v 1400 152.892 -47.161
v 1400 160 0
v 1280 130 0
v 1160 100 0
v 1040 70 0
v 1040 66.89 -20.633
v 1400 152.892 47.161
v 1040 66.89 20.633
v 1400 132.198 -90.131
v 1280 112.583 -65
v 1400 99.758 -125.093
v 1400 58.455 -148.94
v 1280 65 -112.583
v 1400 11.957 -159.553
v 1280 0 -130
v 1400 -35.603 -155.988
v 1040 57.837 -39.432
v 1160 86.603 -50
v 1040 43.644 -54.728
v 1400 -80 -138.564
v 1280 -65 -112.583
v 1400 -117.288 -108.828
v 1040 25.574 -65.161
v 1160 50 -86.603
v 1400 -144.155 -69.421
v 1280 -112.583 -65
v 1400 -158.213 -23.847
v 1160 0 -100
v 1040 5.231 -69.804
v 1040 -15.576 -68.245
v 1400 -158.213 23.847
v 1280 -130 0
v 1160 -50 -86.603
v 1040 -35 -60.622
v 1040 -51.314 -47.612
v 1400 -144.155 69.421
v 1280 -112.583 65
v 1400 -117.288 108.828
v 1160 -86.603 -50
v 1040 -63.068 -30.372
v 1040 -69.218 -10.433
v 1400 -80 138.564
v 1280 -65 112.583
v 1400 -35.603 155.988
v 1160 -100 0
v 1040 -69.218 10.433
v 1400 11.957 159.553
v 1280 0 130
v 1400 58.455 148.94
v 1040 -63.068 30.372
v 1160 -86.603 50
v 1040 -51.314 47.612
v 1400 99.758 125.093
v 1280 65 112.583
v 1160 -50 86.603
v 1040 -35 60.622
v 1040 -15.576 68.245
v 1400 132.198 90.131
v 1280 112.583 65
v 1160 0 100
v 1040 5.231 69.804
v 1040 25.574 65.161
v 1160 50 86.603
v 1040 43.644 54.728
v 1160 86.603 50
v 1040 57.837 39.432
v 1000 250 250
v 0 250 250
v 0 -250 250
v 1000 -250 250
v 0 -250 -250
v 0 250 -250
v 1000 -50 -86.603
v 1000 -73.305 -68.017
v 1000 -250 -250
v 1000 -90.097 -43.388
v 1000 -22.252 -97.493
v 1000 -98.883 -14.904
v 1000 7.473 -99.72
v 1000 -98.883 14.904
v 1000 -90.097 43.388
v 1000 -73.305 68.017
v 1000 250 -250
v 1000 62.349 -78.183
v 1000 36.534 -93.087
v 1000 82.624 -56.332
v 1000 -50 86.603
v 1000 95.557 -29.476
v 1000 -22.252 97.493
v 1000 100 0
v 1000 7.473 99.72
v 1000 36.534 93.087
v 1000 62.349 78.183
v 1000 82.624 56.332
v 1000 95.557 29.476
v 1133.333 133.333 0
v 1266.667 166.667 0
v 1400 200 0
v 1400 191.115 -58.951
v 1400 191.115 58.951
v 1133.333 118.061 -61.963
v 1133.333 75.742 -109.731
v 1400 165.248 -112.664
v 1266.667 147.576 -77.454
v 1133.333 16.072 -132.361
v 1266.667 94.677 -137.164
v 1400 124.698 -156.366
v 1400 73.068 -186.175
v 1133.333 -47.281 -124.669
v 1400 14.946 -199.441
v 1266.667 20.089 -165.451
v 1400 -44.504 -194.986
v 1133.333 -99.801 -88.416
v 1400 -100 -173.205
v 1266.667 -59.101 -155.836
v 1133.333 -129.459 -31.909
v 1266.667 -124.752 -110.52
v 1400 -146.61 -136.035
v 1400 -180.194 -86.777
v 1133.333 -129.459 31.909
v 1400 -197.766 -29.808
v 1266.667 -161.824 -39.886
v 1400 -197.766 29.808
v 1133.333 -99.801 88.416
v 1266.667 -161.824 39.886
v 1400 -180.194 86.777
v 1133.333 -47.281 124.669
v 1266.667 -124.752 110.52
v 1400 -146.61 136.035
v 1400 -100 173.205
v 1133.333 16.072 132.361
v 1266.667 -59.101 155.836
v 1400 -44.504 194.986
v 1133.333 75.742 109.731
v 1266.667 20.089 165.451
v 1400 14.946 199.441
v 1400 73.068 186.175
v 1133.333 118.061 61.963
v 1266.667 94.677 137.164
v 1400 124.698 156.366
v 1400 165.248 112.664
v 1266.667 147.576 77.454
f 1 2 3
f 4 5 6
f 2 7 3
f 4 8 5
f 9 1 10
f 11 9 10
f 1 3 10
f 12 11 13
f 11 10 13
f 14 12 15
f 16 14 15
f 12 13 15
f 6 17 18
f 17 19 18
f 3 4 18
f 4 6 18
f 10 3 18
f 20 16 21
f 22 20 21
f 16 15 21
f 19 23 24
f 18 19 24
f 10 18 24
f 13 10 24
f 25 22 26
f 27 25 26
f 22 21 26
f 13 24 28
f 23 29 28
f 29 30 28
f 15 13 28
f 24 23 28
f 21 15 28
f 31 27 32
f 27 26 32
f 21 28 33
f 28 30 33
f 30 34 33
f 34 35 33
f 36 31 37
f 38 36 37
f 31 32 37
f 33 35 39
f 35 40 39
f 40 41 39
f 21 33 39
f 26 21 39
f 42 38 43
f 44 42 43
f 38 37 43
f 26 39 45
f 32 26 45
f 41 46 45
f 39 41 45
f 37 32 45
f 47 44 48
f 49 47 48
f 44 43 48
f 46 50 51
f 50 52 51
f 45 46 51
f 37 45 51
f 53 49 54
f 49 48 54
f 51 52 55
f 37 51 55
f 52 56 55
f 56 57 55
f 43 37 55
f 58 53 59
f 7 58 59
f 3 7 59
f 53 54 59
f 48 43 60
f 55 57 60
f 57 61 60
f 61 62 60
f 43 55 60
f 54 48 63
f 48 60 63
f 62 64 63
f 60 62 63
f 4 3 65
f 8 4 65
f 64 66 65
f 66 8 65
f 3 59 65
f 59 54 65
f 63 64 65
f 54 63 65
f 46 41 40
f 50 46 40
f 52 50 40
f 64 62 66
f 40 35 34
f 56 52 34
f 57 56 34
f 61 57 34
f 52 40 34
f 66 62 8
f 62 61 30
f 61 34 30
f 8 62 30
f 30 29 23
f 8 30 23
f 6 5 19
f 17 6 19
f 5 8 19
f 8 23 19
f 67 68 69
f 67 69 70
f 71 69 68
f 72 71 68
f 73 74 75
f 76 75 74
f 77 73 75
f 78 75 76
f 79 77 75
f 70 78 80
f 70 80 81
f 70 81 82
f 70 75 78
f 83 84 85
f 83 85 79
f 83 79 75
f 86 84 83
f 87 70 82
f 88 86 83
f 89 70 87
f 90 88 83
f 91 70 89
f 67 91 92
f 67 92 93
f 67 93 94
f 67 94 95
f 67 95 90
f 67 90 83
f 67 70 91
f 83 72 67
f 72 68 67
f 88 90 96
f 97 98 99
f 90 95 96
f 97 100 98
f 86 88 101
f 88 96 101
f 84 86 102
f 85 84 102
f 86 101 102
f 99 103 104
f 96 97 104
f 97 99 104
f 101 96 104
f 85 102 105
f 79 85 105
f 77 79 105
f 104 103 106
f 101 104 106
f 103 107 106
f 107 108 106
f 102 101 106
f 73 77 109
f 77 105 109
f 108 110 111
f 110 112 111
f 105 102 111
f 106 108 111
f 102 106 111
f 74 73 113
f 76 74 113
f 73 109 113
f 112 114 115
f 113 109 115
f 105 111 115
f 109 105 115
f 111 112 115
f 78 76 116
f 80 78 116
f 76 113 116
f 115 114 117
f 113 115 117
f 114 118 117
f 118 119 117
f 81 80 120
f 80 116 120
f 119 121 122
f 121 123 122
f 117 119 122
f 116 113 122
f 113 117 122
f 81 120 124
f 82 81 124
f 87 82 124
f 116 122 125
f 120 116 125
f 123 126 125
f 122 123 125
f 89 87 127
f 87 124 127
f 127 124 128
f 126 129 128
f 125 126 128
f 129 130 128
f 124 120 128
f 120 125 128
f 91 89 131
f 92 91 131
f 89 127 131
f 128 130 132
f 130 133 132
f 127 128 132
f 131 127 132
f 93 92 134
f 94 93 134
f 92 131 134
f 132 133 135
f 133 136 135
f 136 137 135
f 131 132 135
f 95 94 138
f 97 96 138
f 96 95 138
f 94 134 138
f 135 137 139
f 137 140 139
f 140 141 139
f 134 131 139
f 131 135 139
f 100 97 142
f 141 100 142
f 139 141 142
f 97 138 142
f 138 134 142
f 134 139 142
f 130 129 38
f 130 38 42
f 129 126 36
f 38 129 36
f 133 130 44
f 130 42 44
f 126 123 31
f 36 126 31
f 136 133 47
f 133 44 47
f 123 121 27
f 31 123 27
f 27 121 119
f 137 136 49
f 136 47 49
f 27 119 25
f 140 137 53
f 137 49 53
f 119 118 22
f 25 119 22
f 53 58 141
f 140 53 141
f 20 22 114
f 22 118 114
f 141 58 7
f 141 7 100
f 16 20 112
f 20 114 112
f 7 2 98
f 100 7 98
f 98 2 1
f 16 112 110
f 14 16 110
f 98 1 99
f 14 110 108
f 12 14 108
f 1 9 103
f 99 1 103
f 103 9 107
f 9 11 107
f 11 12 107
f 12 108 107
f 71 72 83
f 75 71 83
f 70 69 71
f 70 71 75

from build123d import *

# Parameters (mm, degrees)
BOSS_EXTRUDE1_DEPTH      = 250
BOSS_EXTRUDE1_DEPTH_BACK = 250
SKETCH1_W                = 1000
SKETCH1_H                = 500


with BuildPart() as part:
    # Sketch1 → Boss-Extrude1 (new, two sides: drawn at the far end of the back side and taken through both)
    with BuildSketch(Plane.XY.offset(-BOSS_EXTRUDE1_DEPTH_BACK)):
        with Locations((500, 0)):
            Rectangle(SKETCH1_W, SKETCH1_H)
    extrude(amount=BOSS_EXTRUDE1_DEPTH + BOSS_EXTRUDE1_DEPTH_BACK)

    # Sketch3 → Revolve1 (revolve)
    with BuildSketch(Plane.XY):
        Polygon((1000, 0), (1000, 100), (1400, 200), (1400, 160), (1040, 70), (1040, 0), align=None)
    revolve(axis=Axis((1040, 0, 0), (-1, 0, 0)))


solid = part.part
